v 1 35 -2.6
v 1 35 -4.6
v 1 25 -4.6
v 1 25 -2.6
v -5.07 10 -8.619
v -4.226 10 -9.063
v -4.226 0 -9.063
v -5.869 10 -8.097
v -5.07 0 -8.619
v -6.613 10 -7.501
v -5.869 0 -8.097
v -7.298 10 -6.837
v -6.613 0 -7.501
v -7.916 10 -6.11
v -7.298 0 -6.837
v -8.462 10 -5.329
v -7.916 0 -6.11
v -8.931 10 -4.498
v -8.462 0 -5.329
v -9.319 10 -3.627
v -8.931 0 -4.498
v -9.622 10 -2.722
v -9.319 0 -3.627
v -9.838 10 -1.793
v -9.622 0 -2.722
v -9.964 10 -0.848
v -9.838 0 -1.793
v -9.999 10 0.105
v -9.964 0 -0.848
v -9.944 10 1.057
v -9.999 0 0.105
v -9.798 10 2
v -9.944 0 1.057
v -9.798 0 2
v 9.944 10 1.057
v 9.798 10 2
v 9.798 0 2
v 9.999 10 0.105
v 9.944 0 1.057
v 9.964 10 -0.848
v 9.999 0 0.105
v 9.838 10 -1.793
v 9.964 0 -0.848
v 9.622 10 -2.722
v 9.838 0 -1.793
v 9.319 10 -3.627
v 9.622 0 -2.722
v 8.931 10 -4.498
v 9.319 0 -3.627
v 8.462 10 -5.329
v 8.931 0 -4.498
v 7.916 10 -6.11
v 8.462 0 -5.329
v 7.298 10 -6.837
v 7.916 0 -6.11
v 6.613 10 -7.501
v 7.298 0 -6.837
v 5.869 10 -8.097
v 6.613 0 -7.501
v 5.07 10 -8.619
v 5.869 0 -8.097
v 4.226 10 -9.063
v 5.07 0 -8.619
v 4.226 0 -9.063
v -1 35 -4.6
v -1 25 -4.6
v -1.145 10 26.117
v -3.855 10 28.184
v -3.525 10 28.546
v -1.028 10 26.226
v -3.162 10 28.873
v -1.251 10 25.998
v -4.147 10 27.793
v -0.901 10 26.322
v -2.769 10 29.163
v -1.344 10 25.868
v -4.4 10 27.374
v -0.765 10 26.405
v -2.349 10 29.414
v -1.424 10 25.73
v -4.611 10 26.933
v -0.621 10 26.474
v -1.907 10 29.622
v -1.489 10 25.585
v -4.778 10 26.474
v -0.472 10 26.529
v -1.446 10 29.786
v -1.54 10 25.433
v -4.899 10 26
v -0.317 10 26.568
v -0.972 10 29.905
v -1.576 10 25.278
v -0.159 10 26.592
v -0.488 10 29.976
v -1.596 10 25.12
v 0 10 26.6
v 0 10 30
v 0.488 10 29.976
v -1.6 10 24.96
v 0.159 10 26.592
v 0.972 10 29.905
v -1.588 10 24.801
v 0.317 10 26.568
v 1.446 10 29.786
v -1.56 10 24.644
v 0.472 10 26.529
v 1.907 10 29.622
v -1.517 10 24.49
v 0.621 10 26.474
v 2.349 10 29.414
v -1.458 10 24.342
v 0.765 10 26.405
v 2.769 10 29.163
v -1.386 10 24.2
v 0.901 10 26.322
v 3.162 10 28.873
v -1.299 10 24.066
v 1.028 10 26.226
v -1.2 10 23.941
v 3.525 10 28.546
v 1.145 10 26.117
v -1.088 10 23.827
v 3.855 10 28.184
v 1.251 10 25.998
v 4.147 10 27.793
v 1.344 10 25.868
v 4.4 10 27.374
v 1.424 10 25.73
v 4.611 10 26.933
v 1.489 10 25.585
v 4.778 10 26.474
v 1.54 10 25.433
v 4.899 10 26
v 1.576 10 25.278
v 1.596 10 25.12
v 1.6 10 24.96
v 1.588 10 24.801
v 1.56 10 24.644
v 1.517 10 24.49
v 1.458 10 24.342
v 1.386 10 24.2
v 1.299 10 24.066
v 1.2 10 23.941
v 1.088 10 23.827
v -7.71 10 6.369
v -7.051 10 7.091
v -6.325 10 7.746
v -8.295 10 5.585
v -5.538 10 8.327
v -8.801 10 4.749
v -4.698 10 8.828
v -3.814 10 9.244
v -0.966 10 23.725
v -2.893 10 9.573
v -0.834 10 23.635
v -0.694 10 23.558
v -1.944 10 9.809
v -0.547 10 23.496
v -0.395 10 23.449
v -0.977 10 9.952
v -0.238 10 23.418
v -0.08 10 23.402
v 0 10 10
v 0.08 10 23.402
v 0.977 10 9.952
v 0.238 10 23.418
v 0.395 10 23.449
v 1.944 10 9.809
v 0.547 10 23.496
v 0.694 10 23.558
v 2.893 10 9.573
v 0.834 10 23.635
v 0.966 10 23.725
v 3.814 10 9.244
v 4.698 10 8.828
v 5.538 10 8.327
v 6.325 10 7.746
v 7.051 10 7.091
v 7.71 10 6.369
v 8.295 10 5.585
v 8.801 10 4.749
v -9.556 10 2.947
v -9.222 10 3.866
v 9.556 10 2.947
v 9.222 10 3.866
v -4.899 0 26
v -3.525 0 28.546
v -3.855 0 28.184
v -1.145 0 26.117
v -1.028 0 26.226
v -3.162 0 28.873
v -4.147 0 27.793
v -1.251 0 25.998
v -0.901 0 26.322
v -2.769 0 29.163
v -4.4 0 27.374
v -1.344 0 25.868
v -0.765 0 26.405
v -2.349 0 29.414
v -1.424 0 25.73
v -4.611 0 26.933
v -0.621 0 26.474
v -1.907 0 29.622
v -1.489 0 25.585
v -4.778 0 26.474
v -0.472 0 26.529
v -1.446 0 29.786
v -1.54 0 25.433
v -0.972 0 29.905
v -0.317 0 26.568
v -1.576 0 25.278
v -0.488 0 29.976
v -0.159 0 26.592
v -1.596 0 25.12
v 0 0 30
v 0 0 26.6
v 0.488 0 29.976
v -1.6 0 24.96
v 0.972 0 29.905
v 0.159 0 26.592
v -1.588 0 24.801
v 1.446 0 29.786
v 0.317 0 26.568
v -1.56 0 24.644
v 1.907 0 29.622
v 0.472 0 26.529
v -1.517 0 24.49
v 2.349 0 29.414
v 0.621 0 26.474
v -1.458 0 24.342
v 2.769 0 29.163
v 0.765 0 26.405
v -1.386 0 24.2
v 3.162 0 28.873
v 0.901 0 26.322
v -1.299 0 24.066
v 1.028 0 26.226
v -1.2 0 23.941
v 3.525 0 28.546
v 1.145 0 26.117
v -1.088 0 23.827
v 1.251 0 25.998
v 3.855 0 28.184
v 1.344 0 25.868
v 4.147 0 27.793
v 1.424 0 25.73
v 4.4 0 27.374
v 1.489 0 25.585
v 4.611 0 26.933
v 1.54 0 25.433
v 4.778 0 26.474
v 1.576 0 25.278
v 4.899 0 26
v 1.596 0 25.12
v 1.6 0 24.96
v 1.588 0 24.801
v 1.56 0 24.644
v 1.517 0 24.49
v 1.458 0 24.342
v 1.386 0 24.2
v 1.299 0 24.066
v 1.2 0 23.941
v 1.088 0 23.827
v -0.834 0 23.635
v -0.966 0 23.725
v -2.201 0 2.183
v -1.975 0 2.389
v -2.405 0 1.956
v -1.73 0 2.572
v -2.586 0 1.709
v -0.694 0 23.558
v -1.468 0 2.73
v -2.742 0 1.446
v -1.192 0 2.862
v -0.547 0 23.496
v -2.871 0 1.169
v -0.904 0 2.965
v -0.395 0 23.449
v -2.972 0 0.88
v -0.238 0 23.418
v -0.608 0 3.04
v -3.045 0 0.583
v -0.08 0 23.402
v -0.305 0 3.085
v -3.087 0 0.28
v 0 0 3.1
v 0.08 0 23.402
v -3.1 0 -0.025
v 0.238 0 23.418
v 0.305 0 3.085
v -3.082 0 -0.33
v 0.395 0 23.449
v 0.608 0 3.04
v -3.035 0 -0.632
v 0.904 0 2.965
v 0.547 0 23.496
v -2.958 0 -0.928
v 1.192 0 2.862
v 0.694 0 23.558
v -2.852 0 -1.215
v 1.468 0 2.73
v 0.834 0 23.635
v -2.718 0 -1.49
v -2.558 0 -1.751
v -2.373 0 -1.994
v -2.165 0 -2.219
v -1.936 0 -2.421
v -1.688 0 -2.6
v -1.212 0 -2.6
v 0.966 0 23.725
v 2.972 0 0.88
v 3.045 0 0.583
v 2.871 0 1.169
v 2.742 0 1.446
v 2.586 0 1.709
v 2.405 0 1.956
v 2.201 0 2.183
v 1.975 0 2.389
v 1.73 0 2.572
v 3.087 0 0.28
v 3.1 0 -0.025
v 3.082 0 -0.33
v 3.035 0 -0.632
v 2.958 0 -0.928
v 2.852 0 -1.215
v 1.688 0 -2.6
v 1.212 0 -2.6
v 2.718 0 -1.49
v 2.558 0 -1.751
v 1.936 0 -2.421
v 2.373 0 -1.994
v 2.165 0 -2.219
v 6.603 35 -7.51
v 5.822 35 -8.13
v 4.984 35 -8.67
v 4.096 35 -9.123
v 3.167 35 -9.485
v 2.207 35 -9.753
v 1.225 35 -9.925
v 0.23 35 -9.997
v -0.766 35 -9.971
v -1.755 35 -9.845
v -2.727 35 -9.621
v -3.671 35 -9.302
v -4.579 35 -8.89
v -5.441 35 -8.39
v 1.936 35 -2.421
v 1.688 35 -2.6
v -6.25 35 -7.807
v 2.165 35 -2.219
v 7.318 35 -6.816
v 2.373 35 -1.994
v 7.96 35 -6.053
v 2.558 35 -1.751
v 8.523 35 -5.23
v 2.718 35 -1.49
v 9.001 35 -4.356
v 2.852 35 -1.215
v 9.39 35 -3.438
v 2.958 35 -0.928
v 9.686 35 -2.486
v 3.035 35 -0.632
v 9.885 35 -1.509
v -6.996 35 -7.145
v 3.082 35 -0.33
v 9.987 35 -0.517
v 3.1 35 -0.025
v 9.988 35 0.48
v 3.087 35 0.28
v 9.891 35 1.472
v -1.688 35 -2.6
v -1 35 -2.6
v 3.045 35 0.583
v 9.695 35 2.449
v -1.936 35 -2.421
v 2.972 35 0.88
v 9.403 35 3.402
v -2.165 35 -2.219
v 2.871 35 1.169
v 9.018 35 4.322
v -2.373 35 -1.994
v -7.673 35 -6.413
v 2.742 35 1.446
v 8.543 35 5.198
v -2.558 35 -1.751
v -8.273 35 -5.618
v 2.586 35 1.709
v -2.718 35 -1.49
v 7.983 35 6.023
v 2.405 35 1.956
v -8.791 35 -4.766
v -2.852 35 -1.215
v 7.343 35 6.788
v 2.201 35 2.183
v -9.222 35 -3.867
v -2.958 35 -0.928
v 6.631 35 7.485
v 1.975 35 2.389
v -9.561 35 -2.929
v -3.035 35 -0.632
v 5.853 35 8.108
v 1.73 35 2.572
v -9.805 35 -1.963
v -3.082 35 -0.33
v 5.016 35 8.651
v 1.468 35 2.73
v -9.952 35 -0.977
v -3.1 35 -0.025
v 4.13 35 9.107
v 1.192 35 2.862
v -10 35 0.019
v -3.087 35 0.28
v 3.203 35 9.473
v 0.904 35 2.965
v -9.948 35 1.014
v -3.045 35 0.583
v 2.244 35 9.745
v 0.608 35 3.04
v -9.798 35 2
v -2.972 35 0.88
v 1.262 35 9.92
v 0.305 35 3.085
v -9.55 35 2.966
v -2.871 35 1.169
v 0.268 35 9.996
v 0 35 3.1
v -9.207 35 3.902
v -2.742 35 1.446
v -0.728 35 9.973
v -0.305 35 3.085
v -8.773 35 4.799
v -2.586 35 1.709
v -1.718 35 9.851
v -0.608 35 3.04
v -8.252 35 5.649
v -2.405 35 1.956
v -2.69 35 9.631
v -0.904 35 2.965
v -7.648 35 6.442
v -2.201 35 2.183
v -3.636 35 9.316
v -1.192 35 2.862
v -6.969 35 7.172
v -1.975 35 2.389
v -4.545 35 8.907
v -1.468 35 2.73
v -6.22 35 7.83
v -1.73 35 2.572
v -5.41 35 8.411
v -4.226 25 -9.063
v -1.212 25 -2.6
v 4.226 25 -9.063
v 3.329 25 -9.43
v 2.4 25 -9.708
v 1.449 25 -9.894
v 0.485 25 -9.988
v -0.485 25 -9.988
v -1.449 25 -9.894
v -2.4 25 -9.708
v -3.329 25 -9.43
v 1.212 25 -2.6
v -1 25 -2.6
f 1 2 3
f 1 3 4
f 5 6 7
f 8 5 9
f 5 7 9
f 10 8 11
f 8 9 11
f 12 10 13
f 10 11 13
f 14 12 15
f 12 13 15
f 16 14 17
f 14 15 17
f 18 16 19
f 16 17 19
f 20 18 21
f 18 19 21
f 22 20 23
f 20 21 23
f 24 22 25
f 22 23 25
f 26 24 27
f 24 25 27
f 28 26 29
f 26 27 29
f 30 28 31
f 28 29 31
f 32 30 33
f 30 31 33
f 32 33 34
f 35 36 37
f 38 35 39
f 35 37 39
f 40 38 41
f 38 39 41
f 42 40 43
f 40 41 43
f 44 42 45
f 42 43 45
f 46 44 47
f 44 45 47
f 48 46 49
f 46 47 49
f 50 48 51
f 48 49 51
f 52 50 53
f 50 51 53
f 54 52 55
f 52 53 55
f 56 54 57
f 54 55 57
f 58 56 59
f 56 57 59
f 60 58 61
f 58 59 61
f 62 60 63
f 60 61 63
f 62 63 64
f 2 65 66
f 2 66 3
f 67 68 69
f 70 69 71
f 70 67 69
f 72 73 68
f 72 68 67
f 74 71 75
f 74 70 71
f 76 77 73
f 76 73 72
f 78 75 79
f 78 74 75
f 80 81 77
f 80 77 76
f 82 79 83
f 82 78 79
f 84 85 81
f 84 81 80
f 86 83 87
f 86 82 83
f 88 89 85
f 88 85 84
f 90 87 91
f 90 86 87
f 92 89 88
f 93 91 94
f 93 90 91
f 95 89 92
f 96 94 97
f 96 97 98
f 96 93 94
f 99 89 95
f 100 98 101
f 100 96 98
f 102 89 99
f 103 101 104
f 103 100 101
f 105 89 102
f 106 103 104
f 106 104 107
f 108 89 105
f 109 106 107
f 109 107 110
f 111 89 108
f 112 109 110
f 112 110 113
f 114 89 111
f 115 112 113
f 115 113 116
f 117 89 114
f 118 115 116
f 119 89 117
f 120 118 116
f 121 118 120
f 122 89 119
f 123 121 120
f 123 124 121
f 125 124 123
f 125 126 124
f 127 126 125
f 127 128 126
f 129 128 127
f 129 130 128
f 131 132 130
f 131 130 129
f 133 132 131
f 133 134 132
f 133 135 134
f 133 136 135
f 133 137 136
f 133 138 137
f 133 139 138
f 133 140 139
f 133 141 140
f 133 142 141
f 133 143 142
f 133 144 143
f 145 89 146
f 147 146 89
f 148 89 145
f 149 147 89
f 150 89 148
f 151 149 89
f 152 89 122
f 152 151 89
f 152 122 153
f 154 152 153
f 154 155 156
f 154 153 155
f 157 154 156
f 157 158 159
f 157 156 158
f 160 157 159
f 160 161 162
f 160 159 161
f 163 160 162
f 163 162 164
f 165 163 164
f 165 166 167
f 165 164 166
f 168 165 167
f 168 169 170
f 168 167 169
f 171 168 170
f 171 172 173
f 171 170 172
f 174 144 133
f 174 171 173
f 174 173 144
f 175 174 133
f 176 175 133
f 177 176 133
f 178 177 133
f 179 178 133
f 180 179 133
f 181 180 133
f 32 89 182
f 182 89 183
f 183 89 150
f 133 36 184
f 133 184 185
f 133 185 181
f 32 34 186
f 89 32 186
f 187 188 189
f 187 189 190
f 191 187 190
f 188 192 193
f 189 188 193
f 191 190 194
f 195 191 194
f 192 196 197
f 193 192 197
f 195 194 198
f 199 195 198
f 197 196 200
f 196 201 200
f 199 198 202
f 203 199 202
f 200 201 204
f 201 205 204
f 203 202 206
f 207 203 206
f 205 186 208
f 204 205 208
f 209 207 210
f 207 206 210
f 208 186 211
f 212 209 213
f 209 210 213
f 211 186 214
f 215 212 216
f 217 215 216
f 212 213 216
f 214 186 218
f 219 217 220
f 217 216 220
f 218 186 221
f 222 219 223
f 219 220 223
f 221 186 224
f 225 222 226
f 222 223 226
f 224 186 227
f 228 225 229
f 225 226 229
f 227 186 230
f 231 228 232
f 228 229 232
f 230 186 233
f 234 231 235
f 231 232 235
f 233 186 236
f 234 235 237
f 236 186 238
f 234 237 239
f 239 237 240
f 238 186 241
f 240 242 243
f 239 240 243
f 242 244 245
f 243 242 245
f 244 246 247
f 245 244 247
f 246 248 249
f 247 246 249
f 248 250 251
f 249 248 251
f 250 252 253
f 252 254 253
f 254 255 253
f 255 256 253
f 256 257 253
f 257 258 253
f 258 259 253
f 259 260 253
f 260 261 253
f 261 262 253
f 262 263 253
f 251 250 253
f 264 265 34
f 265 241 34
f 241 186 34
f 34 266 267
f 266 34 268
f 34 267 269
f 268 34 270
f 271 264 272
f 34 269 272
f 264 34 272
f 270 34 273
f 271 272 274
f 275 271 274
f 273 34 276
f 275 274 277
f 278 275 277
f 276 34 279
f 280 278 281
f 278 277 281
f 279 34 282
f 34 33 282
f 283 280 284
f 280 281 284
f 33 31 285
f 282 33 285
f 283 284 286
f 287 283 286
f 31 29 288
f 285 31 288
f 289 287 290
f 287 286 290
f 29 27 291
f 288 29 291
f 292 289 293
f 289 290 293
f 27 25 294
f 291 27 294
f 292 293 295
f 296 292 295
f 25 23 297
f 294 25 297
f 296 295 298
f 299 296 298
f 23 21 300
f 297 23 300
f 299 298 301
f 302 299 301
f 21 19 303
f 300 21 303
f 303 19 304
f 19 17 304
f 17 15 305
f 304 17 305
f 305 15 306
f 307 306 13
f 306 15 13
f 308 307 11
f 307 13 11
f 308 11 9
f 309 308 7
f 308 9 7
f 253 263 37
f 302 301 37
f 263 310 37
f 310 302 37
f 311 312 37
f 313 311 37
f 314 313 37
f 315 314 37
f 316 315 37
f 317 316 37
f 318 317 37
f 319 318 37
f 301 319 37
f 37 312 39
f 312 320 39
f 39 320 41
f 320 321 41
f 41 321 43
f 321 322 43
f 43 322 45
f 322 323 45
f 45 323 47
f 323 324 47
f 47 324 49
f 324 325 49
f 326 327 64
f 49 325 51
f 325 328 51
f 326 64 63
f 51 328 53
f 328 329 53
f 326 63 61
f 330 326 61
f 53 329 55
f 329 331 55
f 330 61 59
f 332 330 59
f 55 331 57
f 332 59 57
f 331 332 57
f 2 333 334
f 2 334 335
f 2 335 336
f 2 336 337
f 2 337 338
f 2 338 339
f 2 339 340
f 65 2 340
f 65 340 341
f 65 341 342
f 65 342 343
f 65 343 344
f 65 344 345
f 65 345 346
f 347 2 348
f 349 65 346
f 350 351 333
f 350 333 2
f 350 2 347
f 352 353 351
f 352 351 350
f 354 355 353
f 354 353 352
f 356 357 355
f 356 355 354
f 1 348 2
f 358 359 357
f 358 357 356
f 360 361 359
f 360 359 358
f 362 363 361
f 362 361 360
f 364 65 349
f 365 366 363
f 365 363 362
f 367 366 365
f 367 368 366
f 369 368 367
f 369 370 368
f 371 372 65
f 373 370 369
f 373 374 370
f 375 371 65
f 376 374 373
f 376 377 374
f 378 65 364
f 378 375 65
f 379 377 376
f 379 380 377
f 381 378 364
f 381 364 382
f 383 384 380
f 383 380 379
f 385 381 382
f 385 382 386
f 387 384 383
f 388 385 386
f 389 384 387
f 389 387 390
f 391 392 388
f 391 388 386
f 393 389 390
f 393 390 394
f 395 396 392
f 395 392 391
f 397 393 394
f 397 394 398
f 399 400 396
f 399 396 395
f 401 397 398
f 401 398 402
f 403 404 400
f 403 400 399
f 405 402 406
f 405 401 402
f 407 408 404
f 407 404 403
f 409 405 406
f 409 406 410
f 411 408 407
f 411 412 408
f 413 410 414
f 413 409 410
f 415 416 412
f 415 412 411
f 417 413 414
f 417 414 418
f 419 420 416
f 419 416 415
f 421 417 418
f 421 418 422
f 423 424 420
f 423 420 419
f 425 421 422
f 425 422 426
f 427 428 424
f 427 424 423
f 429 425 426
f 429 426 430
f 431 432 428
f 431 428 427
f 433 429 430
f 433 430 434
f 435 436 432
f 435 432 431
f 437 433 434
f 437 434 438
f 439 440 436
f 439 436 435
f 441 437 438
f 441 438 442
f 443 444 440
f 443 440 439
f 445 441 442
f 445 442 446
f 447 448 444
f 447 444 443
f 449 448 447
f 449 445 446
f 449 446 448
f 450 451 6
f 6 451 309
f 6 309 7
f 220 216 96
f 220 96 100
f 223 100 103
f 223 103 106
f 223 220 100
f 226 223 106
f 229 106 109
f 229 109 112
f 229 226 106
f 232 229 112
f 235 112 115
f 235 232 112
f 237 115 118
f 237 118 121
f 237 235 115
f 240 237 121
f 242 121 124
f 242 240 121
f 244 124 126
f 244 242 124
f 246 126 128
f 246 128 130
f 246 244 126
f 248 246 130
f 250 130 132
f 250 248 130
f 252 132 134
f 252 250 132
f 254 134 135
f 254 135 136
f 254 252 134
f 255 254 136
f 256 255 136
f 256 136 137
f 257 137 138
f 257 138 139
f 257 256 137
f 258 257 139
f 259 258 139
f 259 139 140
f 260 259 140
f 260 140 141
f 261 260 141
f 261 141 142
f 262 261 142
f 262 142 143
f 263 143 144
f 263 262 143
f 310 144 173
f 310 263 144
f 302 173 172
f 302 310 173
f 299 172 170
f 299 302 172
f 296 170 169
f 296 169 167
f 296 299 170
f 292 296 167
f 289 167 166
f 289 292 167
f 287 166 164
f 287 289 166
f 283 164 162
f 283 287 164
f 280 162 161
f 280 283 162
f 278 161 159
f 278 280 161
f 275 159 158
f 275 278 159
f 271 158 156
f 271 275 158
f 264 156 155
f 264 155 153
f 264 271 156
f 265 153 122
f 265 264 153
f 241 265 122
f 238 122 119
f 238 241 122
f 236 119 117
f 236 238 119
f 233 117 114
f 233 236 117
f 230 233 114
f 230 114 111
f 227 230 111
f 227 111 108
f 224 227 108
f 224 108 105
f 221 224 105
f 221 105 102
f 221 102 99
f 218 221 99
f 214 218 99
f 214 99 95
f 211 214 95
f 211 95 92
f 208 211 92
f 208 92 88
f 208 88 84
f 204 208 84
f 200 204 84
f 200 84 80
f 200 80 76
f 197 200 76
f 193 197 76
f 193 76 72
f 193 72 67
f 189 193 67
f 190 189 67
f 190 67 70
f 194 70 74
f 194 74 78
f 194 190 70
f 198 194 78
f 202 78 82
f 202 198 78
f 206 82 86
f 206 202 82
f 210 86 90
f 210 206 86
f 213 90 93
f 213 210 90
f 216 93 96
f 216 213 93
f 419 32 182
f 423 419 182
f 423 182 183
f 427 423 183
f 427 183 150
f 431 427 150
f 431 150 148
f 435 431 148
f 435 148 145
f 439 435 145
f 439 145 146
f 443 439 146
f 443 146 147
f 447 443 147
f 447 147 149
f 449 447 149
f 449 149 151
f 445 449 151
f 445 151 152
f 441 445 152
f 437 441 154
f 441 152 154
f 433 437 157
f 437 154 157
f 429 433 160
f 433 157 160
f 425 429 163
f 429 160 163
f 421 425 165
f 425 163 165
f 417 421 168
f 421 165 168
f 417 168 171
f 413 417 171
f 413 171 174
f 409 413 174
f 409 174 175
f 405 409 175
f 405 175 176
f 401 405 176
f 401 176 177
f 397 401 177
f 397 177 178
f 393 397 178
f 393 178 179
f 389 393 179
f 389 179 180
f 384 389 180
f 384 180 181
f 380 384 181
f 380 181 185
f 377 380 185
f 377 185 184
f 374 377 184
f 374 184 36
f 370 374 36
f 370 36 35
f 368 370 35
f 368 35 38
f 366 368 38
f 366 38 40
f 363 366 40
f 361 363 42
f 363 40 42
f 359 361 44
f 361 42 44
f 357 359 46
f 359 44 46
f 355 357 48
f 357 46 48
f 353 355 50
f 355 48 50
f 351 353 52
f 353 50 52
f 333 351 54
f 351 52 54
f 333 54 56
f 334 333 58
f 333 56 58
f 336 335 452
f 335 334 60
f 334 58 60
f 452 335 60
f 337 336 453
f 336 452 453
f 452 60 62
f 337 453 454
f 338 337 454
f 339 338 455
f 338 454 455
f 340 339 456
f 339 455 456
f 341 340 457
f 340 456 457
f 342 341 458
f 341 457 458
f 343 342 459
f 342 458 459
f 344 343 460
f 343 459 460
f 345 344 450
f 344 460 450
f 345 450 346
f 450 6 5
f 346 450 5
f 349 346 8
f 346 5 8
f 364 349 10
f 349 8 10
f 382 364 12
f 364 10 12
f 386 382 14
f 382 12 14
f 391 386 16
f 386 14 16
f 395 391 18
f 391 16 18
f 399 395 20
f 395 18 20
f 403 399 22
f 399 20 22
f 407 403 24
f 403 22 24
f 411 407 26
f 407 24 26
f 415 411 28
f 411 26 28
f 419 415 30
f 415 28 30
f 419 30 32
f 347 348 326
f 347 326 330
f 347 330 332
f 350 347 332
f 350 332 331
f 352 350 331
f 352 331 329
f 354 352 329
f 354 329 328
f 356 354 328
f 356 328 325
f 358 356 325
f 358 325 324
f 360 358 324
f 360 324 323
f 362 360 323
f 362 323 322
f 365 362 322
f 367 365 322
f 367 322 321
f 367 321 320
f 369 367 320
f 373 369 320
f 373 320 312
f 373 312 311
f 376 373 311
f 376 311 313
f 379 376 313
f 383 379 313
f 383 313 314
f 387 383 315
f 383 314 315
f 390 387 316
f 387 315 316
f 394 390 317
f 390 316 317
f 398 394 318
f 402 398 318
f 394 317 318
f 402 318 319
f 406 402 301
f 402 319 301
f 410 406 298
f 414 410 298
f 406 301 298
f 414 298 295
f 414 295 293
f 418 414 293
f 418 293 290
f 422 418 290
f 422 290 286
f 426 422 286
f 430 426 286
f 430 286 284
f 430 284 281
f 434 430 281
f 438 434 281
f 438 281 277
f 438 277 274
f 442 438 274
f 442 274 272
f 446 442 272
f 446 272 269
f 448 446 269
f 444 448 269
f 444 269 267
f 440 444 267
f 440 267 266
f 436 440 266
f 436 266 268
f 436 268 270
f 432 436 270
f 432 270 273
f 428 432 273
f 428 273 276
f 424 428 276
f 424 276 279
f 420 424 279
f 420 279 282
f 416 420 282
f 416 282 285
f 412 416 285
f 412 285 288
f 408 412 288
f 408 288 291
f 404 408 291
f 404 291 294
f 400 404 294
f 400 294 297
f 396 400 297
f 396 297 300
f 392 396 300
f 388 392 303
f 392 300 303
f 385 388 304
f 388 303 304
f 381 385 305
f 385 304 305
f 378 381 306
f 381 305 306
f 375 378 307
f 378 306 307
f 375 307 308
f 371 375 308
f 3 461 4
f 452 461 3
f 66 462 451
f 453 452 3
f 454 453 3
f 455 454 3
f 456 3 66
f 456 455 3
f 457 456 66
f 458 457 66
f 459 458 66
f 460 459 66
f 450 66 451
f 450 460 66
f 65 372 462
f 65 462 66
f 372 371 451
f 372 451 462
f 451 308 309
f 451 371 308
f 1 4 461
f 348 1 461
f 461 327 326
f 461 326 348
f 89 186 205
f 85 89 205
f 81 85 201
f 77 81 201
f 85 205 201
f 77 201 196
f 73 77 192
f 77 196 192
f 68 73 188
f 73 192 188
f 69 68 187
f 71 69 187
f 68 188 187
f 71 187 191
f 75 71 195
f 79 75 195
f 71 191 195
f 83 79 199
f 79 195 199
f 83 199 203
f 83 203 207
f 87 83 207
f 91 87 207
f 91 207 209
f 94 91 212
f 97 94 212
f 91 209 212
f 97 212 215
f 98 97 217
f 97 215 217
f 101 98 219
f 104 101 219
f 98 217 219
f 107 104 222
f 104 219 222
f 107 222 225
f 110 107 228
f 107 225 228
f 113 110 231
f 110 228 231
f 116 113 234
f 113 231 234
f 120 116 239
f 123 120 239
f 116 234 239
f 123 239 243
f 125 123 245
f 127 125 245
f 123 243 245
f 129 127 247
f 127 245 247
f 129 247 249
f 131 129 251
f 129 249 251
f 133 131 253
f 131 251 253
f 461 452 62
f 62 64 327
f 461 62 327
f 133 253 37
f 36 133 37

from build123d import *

# Parameters (mm, degrees)
SKETCH_1_R               = 1.6
EXTRUDE_1_DEPTH          = 10
SKETCH_3_R               = 10
EXTRUDE_2_DEPTH          = 25
CUT_EXTRUDE_1_DEPTH      = 41.311288741
CUT_EXTRUDE_1_DEPTH_BACK = 41.311288741
CUT_EXTRUDE_2_DEPTH      = 25


with BuildPart() as part:
    # ｽｹｯﾁ1 → ﾎﾞｽ - 押し出し1 (new body)
    with BuildSketch(Plane(origin=(0, 0, 0), x_dir=(1, 0, 0), z_dir=(0, 1, 0))):
        with BuildLine():
            Line((-9.797958971, -2), (-4.898979486, -26))
            ThreePointArc((-4.898979486, -26), (0, -30), (4.898979486, -26))
            Line((4.898979486, -26), (9.797958971, -2))
            ThreePointArc((9.797958971, -2), (0, 10), (-9.797958971, -2))
        make_face()
        with Locations(Location((0, -25, 0), (0, 0, 270))):
            Circle(SKETCH_1_R, mode=Mode.SUBTRACT)
    extrude(amount=EXTRUDE_1_DEPTH)

    # ｽｹｯﾁ3 → ﾎﾞｽ - 押し出し2 (add)
    with BuildSketch(Plane(origin=(0, 10, 0), x_dir=(1, 0, 0), z_dir=(0, 1, 0))):
        with Locations(Location((0, 0, 0), (0, 0, 191.536959033))):
            Circle(SKETCH_3_R)
    extrude(amount=EXTRUDE_2_DEPTH)

    # ｽｹｯﾁ2 → ｶｯﾄ - 押し出し1 (cut, two sides: drawn at the far end of the back side and taken through both)
    with BuildSketch(Plane(origin=(0, 10, 0), x_dir=(1, 0, 0), z_dir=(0, 1, 0)).offset(-CUT_EXTRUDE_1_DEPTH_BACK)):
        with BuildLine():
            Line((-1.688194302, 2.6), (-1, 2.6))
            Line((-1, 2.6), (-1, 4.6))
            Line((-1, 4.6), (1, 4.6))
            Line((1, 4.6), (1, 2.6))
            Line((1, 2.6), (1.688194302, 2.6))
            ThreePointArc((1.688194302, 2.6), (0, -3.1), (-1.688194302, 2.6))
        make_face()
    extrude(amount=CUT_EXTRUDE_1_DEPTH + CUT_EXTRUDE_1_DEPTH_BACK, mode=Mode.SUBTRACT)

    # ｽｹｯﾁ4 → ｶｯﾄ - 押し出し2 (cut)
    with BuildSketch(Plane(origin=(0, 0, 0), x_dir=(-1, 0, 0), z_dir=(0, -1, 0))):
        with BuildLine():
            Line((-4.226182617, 9.06307787), (0, 0))
            Line((0, 0), (4.226182617, 9.06307787))
            ThreePointArc((4.226182617, 9.06307787), (0, 10), (-4.226182617, 9.06307787))
        make_face()
    extrude(amount=-CUT_EXTRUDE_2_DEPTH, mode=Mode.SUBTRACT)


solid = part.part
